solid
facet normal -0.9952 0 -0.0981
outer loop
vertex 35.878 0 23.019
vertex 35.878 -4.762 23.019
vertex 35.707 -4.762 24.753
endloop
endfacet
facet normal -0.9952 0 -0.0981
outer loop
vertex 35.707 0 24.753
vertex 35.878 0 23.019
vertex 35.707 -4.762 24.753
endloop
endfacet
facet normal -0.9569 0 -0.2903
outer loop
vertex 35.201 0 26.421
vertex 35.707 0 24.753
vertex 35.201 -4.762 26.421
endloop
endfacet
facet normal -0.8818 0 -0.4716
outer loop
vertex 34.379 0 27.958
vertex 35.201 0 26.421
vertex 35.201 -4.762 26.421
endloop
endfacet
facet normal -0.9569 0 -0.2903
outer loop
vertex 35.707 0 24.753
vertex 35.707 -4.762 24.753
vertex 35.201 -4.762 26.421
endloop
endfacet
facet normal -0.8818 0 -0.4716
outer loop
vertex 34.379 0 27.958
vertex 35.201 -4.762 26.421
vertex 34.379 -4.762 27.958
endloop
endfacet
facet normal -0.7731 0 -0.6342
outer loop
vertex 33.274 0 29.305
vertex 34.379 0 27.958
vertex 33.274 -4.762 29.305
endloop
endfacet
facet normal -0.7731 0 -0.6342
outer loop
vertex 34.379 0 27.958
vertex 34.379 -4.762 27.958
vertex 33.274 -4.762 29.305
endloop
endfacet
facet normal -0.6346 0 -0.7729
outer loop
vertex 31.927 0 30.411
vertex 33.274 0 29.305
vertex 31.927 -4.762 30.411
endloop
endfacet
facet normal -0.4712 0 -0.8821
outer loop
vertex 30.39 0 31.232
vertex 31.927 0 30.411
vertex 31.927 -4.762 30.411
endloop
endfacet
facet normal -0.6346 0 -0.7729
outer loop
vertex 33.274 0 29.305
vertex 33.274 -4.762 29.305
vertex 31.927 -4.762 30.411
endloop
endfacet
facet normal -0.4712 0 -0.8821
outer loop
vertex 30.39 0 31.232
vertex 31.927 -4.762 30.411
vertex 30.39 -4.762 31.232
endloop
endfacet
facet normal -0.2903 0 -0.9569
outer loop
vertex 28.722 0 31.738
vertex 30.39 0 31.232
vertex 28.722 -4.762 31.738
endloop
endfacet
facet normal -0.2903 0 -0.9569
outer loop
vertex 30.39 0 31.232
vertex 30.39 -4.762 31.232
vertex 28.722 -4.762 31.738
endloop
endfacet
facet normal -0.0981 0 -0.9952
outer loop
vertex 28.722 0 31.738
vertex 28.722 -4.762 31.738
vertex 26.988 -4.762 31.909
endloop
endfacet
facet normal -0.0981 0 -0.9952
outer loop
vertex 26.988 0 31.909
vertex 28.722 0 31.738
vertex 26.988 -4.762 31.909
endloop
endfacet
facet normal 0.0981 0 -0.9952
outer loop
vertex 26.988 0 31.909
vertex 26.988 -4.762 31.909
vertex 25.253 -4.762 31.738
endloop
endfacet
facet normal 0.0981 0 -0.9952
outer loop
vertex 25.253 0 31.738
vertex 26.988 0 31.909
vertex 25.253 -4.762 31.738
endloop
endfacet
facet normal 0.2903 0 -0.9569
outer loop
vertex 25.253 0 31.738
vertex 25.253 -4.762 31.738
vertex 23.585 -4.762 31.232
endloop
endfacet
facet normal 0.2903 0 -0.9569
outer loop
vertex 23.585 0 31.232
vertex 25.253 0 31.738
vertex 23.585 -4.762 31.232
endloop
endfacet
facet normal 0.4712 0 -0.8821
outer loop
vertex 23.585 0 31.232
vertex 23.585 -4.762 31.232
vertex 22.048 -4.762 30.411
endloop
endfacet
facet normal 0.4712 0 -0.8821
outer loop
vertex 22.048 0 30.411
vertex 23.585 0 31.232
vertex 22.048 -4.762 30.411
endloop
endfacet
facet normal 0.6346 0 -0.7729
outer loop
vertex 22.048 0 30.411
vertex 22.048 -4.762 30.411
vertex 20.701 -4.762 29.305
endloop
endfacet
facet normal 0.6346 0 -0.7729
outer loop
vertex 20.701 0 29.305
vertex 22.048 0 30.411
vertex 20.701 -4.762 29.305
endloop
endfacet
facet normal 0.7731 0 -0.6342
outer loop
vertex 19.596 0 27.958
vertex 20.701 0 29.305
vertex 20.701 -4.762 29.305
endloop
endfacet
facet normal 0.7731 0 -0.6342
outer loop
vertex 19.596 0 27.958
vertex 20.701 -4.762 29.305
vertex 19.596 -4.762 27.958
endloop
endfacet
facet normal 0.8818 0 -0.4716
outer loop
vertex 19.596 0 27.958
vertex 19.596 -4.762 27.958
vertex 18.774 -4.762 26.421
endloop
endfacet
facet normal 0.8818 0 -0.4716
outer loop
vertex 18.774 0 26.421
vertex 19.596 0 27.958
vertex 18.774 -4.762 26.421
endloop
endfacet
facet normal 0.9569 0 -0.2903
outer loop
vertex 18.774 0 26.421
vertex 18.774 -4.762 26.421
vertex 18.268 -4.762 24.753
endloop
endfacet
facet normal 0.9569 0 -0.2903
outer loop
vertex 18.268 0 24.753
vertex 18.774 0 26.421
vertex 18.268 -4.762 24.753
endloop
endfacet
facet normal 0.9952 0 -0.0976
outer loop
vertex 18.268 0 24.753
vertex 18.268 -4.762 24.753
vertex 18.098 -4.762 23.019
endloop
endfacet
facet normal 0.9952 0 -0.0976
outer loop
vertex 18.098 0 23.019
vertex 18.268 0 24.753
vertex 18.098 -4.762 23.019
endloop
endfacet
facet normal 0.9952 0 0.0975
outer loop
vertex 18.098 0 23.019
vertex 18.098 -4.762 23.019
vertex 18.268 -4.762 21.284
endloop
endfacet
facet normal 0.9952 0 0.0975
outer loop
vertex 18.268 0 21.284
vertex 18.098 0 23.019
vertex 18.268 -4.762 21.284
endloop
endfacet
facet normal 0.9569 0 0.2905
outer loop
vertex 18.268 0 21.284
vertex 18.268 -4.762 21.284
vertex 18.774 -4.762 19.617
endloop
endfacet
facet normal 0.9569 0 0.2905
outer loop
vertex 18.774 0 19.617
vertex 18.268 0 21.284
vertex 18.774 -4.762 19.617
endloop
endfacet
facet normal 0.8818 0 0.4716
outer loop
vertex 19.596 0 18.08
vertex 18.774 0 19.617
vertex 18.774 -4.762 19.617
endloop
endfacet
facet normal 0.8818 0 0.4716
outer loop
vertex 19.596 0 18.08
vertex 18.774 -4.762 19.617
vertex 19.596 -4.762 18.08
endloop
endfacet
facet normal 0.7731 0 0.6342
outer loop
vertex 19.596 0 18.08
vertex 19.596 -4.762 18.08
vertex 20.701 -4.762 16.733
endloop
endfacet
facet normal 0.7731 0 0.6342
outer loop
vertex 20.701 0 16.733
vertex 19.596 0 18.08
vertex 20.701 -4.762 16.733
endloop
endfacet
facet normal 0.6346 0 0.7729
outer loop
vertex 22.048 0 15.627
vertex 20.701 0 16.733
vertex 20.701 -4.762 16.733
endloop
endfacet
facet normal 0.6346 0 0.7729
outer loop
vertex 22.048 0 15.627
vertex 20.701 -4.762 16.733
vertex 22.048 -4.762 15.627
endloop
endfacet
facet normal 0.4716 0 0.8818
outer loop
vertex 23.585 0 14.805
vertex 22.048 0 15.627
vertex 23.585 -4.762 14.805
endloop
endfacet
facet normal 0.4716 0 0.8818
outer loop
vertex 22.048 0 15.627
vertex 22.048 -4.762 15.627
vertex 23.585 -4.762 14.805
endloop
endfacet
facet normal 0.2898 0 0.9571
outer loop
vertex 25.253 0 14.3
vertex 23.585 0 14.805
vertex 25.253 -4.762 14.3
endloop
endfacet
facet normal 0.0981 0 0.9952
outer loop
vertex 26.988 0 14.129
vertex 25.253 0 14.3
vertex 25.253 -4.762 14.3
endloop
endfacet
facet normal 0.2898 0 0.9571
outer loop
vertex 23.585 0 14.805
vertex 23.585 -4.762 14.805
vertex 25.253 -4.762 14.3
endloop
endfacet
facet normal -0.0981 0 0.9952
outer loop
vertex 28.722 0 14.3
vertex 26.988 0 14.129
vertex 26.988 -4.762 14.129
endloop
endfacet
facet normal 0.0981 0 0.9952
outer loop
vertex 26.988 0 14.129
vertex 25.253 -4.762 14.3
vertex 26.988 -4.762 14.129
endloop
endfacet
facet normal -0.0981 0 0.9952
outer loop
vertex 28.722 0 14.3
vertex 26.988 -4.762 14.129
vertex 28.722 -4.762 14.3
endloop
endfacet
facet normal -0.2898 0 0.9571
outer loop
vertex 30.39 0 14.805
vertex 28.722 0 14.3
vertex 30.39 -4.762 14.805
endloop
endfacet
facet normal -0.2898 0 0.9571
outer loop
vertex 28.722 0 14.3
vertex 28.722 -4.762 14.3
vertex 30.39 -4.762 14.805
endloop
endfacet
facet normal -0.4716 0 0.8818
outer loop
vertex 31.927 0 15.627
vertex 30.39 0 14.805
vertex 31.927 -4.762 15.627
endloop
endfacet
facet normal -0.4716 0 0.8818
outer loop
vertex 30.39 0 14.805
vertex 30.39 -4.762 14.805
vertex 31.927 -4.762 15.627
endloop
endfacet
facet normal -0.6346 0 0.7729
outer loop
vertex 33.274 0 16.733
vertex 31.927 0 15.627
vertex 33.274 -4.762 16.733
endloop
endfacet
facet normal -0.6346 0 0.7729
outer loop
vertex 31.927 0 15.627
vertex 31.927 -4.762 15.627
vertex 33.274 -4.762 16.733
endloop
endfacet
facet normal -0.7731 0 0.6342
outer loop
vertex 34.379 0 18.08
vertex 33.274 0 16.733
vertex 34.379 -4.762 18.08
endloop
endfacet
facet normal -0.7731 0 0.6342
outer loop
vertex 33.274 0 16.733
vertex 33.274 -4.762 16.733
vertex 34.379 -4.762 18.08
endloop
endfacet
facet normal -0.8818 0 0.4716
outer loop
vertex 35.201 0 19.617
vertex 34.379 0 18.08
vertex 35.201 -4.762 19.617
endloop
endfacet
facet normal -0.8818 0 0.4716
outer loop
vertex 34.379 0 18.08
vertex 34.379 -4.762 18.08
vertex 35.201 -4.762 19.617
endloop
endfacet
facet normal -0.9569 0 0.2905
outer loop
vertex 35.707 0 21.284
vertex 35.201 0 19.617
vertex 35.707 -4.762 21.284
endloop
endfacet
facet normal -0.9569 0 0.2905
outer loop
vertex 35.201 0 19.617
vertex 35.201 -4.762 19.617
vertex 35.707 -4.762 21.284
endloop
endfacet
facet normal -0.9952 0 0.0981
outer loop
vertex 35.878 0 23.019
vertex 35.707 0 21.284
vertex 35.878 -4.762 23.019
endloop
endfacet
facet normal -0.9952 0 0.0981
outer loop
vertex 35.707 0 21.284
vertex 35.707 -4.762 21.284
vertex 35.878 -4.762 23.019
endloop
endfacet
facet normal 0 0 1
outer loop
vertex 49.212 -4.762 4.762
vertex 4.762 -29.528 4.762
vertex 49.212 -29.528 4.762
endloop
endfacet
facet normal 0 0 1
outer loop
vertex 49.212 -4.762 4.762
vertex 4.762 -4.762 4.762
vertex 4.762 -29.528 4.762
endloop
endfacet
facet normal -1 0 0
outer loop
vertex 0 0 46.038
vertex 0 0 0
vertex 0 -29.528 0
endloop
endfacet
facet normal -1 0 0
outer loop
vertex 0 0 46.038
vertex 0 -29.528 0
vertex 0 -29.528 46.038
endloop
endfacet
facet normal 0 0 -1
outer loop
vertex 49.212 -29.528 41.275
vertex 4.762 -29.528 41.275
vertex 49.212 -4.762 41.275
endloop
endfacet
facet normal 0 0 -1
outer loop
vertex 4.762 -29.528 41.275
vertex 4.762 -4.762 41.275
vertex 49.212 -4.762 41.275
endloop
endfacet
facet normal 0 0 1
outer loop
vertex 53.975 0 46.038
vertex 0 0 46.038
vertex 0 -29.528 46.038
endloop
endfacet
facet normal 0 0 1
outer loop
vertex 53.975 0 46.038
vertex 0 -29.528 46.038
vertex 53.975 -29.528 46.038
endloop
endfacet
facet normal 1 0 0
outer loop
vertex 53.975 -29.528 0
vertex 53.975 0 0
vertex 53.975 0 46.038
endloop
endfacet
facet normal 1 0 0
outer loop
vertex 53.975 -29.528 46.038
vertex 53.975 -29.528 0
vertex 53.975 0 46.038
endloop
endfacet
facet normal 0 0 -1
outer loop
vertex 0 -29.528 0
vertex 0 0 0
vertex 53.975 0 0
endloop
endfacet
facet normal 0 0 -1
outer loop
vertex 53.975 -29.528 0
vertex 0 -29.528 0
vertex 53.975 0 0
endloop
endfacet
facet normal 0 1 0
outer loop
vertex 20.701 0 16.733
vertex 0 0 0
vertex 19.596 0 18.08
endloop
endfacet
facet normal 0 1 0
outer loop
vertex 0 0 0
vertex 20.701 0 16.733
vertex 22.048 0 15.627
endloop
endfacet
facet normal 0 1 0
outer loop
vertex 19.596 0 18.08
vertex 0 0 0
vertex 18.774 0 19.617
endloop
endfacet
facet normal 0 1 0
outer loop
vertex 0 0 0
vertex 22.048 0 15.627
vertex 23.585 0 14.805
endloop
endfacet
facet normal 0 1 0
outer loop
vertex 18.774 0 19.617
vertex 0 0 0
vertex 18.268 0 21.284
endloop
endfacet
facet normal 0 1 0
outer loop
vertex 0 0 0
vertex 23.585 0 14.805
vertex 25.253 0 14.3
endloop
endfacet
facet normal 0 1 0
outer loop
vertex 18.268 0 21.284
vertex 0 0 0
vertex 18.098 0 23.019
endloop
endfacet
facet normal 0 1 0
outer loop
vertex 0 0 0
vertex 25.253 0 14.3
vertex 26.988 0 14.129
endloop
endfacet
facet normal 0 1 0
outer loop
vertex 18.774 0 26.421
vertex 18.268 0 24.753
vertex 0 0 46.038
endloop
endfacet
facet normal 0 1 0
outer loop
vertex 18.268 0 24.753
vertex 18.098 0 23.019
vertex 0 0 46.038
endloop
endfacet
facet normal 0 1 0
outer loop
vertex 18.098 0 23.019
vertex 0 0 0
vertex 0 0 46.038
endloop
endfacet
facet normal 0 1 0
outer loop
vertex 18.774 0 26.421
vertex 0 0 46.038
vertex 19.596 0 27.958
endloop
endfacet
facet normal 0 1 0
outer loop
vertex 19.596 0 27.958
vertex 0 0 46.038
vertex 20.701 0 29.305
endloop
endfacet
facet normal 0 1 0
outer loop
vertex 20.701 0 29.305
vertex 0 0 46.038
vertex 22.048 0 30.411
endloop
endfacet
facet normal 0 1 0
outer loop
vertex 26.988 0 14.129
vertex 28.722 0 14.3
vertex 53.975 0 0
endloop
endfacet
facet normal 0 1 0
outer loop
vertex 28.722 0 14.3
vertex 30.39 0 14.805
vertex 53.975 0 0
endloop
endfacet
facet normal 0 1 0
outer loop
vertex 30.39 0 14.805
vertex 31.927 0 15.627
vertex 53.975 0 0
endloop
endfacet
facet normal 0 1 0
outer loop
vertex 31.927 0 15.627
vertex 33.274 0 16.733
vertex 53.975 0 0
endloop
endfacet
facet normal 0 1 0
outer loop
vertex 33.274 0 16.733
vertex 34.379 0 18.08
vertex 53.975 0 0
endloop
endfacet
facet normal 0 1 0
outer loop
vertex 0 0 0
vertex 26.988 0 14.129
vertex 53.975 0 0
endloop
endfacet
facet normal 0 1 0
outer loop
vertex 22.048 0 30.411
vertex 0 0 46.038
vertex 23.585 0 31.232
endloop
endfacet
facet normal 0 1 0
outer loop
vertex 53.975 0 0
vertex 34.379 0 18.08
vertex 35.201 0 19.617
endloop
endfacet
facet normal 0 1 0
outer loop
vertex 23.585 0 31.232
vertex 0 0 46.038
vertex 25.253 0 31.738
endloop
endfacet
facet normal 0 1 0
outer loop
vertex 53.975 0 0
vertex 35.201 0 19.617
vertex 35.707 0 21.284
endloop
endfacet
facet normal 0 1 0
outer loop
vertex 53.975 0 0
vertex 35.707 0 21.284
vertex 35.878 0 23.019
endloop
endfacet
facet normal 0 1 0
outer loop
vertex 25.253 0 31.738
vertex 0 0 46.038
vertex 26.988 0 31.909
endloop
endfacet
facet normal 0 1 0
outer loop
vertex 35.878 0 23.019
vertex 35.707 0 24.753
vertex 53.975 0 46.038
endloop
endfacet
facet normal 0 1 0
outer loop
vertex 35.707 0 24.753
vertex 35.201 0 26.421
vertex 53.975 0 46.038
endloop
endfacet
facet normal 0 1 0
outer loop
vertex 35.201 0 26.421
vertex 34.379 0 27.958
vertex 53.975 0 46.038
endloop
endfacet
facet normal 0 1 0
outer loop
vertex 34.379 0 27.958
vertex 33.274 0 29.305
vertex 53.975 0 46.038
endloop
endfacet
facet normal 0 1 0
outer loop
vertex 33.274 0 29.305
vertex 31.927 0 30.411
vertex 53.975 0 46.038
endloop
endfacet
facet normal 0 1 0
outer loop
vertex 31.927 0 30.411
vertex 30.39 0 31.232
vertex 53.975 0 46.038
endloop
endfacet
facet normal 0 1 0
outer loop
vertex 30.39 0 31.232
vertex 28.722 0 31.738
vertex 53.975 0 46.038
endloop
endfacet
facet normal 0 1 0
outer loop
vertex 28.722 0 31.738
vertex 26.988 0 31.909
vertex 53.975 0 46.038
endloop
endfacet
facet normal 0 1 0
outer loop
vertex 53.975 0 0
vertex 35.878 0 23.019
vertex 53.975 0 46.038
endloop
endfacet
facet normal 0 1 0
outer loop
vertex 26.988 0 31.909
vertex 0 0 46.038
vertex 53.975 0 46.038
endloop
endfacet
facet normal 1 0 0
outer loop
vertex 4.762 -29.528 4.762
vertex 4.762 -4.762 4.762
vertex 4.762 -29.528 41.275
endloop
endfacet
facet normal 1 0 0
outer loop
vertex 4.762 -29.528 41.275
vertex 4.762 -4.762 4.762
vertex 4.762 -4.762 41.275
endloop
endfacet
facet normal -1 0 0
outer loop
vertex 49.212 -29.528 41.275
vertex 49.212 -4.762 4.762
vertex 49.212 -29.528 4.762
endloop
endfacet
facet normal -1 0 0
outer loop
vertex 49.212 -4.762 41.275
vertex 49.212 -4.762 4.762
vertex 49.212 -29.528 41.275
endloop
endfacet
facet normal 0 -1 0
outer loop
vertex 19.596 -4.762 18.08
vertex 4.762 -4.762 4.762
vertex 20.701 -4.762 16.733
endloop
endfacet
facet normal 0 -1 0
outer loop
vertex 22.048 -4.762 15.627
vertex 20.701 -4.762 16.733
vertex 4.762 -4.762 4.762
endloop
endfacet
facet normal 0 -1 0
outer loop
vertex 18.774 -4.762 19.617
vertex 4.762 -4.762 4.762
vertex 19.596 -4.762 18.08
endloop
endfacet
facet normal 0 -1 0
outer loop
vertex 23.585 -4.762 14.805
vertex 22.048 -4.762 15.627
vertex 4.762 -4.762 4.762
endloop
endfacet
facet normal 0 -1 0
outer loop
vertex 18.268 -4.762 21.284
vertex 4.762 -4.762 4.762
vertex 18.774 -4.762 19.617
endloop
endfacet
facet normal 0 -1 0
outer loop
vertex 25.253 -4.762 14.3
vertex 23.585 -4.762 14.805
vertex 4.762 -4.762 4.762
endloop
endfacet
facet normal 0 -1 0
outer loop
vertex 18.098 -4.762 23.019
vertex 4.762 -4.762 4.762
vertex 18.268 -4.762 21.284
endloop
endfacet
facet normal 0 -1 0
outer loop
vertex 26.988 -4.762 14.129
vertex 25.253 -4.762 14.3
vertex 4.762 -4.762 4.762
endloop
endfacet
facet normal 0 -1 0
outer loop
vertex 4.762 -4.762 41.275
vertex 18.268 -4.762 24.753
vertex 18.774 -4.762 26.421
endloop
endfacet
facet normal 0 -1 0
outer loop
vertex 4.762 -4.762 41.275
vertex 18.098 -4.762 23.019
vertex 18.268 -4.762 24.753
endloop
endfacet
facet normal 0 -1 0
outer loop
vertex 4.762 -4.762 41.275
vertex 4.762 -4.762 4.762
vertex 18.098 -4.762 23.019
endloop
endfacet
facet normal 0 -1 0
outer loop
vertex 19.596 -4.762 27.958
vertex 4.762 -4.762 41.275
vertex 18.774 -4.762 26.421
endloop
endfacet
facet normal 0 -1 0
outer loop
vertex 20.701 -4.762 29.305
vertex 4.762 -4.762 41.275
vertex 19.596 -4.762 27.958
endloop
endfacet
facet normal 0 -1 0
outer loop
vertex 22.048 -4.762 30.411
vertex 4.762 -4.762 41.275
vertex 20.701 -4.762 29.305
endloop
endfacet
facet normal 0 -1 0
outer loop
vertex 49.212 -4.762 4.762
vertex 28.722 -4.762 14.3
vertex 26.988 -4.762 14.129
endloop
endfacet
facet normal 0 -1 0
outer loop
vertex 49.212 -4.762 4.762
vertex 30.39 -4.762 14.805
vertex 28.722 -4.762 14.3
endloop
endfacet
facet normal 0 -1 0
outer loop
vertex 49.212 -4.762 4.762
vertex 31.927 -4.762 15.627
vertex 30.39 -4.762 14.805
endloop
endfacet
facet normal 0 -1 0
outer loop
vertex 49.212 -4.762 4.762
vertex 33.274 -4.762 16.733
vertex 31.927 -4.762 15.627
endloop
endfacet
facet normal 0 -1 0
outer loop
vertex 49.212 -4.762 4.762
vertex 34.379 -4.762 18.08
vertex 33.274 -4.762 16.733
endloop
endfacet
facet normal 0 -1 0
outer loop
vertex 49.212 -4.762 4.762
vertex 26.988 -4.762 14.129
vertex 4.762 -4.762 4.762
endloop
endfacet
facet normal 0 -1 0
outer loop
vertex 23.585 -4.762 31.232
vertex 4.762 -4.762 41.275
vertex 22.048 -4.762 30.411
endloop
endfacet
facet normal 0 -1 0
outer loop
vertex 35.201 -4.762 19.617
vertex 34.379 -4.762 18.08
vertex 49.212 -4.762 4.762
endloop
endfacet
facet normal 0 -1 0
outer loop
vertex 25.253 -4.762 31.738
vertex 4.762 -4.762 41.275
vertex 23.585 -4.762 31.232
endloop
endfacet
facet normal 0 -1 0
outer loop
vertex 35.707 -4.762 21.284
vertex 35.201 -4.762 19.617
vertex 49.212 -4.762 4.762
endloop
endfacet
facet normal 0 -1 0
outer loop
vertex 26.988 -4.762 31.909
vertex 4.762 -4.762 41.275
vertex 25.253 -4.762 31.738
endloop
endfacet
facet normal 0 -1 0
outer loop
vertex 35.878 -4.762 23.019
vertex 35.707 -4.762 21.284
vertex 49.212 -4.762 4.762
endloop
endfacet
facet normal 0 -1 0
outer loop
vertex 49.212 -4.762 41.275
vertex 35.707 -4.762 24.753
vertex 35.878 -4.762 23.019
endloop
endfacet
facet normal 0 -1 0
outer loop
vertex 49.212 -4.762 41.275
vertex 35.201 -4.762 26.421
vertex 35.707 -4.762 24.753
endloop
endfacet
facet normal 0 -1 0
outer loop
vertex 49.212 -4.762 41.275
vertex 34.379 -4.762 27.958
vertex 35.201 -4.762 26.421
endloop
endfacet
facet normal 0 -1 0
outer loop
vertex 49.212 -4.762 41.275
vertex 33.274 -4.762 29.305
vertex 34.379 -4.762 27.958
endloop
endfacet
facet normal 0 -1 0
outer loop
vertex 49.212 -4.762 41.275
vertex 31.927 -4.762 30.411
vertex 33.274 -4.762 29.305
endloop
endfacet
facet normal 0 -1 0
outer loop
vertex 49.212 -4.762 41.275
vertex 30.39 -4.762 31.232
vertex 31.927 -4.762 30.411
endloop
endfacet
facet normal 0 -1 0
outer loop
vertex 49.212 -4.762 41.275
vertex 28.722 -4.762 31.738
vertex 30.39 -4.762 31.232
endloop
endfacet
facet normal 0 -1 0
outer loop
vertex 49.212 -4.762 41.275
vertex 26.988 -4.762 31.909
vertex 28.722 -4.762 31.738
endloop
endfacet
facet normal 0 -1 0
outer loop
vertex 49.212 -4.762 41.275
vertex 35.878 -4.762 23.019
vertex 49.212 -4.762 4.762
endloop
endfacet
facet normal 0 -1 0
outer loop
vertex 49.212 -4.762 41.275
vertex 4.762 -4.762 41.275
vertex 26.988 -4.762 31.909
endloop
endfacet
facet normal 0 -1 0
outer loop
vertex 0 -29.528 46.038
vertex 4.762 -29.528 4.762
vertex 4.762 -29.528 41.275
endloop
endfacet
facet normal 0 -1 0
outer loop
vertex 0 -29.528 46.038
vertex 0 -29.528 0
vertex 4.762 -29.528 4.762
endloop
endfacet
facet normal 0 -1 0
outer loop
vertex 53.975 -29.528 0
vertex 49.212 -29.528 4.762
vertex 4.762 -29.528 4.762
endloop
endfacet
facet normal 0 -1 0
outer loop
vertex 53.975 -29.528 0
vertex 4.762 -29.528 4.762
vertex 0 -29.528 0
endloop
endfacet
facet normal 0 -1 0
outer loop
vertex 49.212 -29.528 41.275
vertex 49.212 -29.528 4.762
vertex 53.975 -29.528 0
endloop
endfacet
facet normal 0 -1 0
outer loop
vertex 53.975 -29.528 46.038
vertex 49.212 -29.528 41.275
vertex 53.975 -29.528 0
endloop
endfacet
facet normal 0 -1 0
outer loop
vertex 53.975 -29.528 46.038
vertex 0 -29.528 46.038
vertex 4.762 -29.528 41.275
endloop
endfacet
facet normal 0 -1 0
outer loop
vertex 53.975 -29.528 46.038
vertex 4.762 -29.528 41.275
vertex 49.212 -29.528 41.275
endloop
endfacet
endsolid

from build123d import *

# Parameters (mm, degrees)
F0_W     = 53.975
F0_H     = 46.0375
F1_DEPTH = 29.5275
F2_T     = -4.7625
F4_D     = 17.78
F4_DEPTH = 25.4


with BuildPart() as f1:
    # F0 (on Front) → F1 (new body)
    with BuildSketch(Plane.XZ):
        with Locations((26.9875, 23.01875)):
            Rectangle(F0_W, F0_H)
    extrude(amount=F1_DEPTH)

    # F2
    f2_openings = [f1.faces().sort_by_distance(p)[0] for p in [
        (26.9875, -29.5275, 23.01875),
    ]]
    offset(amount=F2_T, openings=f2_openings)

    # F4
    with Locations(Plane(origin=(0, 0, 0), x_dir=(-1, 0, 0), z_dir=(0, 1, 0))):
        with Locations((-26.9875, 23.01875)):
            Hole(F4_D / 2, depth=F4_DEPTH)


solid = f1.part
